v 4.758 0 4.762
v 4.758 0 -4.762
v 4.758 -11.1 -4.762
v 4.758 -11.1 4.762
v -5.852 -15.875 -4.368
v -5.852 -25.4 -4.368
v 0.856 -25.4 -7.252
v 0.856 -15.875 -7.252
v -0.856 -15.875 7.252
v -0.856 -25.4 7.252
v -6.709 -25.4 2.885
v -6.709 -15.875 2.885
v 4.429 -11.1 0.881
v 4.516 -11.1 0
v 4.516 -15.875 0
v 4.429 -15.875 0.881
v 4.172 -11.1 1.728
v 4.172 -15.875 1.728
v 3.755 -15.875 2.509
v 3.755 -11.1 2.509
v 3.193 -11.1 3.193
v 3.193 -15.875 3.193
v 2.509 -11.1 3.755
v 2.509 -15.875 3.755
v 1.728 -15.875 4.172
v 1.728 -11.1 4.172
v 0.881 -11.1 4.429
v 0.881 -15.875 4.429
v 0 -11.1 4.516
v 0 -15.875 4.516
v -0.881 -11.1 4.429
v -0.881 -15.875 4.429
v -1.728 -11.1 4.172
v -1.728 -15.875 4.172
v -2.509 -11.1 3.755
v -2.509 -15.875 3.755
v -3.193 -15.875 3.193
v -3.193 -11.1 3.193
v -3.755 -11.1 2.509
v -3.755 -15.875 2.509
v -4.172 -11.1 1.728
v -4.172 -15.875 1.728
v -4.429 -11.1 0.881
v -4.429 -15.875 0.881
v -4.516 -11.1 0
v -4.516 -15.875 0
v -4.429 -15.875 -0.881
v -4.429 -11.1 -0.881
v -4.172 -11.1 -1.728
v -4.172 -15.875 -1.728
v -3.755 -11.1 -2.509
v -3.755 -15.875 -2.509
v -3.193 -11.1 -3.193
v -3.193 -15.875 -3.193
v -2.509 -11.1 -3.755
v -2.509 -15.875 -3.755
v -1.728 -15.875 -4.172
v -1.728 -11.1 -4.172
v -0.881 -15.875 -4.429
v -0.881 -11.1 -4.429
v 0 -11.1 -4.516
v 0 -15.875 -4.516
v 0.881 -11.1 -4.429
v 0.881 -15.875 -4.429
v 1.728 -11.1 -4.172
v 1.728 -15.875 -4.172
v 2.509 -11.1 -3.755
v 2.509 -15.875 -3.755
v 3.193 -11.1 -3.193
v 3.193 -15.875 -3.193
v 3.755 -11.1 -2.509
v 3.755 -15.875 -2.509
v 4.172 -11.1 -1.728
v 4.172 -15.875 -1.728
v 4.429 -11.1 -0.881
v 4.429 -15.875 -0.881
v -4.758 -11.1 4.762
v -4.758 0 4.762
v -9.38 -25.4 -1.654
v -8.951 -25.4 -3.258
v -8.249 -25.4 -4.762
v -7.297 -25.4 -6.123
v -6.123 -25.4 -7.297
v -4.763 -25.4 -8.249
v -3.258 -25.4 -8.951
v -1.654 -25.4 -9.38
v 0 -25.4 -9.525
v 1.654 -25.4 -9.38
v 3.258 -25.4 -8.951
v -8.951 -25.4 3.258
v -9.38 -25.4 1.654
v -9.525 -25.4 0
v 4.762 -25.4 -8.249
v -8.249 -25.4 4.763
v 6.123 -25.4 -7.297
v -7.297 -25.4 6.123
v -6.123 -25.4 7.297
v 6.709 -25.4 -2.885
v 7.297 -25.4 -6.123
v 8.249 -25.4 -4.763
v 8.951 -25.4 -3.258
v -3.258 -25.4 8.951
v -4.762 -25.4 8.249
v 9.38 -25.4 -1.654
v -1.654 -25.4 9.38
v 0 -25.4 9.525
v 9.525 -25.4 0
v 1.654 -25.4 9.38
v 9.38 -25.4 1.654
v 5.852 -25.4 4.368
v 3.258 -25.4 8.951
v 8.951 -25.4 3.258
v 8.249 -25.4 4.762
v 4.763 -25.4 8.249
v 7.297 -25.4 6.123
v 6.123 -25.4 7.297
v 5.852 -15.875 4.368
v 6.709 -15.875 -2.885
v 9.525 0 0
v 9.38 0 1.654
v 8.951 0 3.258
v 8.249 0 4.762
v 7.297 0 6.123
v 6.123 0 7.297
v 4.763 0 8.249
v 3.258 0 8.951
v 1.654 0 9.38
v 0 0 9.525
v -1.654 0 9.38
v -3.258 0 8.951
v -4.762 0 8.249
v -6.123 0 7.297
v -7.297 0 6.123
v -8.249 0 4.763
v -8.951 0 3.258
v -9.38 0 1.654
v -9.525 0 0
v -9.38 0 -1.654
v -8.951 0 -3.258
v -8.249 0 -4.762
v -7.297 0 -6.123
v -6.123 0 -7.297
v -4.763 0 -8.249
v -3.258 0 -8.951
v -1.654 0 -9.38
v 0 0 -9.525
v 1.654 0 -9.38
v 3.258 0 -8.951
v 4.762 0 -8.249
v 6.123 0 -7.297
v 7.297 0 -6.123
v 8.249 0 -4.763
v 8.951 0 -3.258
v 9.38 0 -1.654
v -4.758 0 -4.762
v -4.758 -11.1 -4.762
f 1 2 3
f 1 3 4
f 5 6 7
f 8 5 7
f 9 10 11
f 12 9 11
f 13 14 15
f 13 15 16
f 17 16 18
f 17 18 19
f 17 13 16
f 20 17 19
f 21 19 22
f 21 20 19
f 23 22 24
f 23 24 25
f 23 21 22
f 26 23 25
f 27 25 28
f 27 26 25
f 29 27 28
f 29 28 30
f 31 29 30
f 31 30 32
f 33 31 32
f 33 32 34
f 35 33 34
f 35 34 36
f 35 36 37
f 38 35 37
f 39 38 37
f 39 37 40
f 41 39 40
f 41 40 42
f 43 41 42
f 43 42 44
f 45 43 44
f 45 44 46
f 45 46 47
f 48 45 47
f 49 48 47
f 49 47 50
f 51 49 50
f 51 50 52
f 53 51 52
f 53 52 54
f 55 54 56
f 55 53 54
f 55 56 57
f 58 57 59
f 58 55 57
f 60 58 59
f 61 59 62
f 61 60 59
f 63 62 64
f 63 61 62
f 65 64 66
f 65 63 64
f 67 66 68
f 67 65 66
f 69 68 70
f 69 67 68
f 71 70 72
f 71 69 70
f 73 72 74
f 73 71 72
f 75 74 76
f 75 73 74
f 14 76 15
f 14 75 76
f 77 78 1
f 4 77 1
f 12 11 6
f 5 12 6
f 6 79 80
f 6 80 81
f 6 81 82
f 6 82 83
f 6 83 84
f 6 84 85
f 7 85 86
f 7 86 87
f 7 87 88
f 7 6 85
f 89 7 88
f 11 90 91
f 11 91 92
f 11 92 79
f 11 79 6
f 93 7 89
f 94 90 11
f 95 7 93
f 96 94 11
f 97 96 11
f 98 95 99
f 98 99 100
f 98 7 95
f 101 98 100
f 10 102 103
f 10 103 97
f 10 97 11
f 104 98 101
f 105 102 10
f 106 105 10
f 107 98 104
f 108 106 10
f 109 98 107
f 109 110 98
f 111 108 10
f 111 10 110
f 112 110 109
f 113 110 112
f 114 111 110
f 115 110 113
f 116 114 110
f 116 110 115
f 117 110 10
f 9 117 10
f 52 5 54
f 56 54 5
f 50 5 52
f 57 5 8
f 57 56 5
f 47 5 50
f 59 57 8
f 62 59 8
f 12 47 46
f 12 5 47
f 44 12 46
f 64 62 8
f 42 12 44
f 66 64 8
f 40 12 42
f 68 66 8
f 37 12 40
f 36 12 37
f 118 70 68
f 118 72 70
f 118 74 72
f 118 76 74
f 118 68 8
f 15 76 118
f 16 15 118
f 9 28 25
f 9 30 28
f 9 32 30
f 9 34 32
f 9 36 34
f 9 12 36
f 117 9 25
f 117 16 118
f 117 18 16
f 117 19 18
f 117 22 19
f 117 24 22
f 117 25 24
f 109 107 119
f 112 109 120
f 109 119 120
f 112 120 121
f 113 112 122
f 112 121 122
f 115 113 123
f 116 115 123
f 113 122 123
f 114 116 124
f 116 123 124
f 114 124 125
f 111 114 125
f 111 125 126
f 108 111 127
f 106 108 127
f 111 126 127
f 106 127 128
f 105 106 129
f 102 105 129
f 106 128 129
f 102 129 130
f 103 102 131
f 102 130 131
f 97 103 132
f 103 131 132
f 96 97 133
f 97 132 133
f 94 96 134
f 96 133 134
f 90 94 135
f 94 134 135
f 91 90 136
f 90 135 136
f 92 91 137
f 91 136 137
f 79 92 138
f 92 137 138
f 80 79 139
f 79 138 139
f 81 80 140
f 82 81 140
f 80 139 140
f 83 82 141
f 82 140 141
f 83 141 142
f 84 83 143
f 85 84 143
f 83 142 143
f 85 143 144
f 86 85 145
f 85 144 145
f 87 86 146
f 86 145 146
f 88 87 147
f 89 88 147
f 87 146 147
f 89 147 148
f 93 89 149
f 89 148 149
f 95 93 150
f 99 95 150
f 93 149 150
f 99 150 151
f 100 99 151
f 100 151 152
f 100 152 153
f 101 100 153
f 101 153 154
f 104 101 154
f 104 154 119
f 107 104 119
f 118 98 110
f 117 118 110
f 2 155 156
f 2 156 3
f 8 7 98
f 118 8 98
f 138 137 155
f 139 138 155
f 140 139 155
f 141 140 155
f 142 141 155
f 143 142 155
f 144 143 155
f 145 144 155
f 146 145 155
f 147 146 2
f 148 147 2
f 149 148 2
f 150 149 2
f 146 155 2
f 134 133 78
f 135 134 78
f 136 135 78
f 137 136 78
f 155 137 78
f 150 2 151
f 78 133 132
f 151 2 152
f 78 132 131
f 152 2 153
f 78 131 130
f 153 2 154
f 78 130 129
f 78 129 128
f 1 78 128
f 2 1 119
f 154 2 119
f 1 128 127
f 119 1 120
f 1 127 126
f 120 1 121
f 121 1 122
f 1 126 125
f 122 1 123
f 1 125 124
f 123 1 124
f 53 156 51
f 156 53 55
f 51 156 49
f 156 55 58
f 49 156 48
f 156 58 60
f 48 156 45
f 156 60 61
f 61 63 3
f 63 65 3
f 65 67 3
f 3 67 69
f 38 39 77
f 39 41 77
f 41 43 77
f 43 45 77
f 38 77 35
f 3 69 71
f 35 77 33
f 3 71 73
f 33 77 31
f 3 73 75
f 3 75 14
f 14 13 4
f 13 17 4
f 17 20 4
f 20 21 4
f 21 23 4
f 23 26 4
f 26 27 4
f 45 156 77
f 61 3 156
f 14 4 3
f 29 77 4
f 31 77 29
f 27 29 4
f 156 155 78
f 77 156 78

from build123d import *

# Parameters (mm, degrees)
F0_R     = 9.525
F1_DEPTH = 25.4
F2_R     = 4.515684
F3_DEPTH = 25.401
F2_W     = 9.515054
F2_H     = 9.525
F4_DEPTH = 11.0998
F5_R     = 4.515684
F6_DEPTH = 9.525


with BuildPart() as f1:
    # F0 (on Front) → F1 (new body)
    with BuildSketch(Plane.XZ):
        Circle(F0_R)
    extrude(amount=F1_DEPTH)

    # F2 (on Front) → F3 (cut, through all)
    with BuildSketch(Plane.XZ):
        Circle(F2_R)
    extrude(amount=F3_DEPTH, mode=Mode.SUBTRACT)

    # F2 (on Front) → F4 (cut)
    with BuildSketch(Plane.XZ):
        Rectangle(F2_W, F2_H)
        Circle(F2_R, mode=Mode.SUBTRACT)
    extrude(amount=F4_DEPTH, mode=Mode.SUBTRACT)

    # F5 (on face) → F6 (cut)
    with BuildSketch(Plane.XZ.offset(25.4)):
        Polygon((-0.856141, 7.25214), (-6.708608, 2.88463), (-5.852467, -4.36751), (0.856141, -7.25214), (6.708608, -2.88463), (5.852467, 4.36751), align=None)
        Circle(F5_R, mode=Mode.SUBTRACT)
    extrude(amount=-F6_DEPTH, mode=Mode.SUBTRACT)


solid = f1.part
